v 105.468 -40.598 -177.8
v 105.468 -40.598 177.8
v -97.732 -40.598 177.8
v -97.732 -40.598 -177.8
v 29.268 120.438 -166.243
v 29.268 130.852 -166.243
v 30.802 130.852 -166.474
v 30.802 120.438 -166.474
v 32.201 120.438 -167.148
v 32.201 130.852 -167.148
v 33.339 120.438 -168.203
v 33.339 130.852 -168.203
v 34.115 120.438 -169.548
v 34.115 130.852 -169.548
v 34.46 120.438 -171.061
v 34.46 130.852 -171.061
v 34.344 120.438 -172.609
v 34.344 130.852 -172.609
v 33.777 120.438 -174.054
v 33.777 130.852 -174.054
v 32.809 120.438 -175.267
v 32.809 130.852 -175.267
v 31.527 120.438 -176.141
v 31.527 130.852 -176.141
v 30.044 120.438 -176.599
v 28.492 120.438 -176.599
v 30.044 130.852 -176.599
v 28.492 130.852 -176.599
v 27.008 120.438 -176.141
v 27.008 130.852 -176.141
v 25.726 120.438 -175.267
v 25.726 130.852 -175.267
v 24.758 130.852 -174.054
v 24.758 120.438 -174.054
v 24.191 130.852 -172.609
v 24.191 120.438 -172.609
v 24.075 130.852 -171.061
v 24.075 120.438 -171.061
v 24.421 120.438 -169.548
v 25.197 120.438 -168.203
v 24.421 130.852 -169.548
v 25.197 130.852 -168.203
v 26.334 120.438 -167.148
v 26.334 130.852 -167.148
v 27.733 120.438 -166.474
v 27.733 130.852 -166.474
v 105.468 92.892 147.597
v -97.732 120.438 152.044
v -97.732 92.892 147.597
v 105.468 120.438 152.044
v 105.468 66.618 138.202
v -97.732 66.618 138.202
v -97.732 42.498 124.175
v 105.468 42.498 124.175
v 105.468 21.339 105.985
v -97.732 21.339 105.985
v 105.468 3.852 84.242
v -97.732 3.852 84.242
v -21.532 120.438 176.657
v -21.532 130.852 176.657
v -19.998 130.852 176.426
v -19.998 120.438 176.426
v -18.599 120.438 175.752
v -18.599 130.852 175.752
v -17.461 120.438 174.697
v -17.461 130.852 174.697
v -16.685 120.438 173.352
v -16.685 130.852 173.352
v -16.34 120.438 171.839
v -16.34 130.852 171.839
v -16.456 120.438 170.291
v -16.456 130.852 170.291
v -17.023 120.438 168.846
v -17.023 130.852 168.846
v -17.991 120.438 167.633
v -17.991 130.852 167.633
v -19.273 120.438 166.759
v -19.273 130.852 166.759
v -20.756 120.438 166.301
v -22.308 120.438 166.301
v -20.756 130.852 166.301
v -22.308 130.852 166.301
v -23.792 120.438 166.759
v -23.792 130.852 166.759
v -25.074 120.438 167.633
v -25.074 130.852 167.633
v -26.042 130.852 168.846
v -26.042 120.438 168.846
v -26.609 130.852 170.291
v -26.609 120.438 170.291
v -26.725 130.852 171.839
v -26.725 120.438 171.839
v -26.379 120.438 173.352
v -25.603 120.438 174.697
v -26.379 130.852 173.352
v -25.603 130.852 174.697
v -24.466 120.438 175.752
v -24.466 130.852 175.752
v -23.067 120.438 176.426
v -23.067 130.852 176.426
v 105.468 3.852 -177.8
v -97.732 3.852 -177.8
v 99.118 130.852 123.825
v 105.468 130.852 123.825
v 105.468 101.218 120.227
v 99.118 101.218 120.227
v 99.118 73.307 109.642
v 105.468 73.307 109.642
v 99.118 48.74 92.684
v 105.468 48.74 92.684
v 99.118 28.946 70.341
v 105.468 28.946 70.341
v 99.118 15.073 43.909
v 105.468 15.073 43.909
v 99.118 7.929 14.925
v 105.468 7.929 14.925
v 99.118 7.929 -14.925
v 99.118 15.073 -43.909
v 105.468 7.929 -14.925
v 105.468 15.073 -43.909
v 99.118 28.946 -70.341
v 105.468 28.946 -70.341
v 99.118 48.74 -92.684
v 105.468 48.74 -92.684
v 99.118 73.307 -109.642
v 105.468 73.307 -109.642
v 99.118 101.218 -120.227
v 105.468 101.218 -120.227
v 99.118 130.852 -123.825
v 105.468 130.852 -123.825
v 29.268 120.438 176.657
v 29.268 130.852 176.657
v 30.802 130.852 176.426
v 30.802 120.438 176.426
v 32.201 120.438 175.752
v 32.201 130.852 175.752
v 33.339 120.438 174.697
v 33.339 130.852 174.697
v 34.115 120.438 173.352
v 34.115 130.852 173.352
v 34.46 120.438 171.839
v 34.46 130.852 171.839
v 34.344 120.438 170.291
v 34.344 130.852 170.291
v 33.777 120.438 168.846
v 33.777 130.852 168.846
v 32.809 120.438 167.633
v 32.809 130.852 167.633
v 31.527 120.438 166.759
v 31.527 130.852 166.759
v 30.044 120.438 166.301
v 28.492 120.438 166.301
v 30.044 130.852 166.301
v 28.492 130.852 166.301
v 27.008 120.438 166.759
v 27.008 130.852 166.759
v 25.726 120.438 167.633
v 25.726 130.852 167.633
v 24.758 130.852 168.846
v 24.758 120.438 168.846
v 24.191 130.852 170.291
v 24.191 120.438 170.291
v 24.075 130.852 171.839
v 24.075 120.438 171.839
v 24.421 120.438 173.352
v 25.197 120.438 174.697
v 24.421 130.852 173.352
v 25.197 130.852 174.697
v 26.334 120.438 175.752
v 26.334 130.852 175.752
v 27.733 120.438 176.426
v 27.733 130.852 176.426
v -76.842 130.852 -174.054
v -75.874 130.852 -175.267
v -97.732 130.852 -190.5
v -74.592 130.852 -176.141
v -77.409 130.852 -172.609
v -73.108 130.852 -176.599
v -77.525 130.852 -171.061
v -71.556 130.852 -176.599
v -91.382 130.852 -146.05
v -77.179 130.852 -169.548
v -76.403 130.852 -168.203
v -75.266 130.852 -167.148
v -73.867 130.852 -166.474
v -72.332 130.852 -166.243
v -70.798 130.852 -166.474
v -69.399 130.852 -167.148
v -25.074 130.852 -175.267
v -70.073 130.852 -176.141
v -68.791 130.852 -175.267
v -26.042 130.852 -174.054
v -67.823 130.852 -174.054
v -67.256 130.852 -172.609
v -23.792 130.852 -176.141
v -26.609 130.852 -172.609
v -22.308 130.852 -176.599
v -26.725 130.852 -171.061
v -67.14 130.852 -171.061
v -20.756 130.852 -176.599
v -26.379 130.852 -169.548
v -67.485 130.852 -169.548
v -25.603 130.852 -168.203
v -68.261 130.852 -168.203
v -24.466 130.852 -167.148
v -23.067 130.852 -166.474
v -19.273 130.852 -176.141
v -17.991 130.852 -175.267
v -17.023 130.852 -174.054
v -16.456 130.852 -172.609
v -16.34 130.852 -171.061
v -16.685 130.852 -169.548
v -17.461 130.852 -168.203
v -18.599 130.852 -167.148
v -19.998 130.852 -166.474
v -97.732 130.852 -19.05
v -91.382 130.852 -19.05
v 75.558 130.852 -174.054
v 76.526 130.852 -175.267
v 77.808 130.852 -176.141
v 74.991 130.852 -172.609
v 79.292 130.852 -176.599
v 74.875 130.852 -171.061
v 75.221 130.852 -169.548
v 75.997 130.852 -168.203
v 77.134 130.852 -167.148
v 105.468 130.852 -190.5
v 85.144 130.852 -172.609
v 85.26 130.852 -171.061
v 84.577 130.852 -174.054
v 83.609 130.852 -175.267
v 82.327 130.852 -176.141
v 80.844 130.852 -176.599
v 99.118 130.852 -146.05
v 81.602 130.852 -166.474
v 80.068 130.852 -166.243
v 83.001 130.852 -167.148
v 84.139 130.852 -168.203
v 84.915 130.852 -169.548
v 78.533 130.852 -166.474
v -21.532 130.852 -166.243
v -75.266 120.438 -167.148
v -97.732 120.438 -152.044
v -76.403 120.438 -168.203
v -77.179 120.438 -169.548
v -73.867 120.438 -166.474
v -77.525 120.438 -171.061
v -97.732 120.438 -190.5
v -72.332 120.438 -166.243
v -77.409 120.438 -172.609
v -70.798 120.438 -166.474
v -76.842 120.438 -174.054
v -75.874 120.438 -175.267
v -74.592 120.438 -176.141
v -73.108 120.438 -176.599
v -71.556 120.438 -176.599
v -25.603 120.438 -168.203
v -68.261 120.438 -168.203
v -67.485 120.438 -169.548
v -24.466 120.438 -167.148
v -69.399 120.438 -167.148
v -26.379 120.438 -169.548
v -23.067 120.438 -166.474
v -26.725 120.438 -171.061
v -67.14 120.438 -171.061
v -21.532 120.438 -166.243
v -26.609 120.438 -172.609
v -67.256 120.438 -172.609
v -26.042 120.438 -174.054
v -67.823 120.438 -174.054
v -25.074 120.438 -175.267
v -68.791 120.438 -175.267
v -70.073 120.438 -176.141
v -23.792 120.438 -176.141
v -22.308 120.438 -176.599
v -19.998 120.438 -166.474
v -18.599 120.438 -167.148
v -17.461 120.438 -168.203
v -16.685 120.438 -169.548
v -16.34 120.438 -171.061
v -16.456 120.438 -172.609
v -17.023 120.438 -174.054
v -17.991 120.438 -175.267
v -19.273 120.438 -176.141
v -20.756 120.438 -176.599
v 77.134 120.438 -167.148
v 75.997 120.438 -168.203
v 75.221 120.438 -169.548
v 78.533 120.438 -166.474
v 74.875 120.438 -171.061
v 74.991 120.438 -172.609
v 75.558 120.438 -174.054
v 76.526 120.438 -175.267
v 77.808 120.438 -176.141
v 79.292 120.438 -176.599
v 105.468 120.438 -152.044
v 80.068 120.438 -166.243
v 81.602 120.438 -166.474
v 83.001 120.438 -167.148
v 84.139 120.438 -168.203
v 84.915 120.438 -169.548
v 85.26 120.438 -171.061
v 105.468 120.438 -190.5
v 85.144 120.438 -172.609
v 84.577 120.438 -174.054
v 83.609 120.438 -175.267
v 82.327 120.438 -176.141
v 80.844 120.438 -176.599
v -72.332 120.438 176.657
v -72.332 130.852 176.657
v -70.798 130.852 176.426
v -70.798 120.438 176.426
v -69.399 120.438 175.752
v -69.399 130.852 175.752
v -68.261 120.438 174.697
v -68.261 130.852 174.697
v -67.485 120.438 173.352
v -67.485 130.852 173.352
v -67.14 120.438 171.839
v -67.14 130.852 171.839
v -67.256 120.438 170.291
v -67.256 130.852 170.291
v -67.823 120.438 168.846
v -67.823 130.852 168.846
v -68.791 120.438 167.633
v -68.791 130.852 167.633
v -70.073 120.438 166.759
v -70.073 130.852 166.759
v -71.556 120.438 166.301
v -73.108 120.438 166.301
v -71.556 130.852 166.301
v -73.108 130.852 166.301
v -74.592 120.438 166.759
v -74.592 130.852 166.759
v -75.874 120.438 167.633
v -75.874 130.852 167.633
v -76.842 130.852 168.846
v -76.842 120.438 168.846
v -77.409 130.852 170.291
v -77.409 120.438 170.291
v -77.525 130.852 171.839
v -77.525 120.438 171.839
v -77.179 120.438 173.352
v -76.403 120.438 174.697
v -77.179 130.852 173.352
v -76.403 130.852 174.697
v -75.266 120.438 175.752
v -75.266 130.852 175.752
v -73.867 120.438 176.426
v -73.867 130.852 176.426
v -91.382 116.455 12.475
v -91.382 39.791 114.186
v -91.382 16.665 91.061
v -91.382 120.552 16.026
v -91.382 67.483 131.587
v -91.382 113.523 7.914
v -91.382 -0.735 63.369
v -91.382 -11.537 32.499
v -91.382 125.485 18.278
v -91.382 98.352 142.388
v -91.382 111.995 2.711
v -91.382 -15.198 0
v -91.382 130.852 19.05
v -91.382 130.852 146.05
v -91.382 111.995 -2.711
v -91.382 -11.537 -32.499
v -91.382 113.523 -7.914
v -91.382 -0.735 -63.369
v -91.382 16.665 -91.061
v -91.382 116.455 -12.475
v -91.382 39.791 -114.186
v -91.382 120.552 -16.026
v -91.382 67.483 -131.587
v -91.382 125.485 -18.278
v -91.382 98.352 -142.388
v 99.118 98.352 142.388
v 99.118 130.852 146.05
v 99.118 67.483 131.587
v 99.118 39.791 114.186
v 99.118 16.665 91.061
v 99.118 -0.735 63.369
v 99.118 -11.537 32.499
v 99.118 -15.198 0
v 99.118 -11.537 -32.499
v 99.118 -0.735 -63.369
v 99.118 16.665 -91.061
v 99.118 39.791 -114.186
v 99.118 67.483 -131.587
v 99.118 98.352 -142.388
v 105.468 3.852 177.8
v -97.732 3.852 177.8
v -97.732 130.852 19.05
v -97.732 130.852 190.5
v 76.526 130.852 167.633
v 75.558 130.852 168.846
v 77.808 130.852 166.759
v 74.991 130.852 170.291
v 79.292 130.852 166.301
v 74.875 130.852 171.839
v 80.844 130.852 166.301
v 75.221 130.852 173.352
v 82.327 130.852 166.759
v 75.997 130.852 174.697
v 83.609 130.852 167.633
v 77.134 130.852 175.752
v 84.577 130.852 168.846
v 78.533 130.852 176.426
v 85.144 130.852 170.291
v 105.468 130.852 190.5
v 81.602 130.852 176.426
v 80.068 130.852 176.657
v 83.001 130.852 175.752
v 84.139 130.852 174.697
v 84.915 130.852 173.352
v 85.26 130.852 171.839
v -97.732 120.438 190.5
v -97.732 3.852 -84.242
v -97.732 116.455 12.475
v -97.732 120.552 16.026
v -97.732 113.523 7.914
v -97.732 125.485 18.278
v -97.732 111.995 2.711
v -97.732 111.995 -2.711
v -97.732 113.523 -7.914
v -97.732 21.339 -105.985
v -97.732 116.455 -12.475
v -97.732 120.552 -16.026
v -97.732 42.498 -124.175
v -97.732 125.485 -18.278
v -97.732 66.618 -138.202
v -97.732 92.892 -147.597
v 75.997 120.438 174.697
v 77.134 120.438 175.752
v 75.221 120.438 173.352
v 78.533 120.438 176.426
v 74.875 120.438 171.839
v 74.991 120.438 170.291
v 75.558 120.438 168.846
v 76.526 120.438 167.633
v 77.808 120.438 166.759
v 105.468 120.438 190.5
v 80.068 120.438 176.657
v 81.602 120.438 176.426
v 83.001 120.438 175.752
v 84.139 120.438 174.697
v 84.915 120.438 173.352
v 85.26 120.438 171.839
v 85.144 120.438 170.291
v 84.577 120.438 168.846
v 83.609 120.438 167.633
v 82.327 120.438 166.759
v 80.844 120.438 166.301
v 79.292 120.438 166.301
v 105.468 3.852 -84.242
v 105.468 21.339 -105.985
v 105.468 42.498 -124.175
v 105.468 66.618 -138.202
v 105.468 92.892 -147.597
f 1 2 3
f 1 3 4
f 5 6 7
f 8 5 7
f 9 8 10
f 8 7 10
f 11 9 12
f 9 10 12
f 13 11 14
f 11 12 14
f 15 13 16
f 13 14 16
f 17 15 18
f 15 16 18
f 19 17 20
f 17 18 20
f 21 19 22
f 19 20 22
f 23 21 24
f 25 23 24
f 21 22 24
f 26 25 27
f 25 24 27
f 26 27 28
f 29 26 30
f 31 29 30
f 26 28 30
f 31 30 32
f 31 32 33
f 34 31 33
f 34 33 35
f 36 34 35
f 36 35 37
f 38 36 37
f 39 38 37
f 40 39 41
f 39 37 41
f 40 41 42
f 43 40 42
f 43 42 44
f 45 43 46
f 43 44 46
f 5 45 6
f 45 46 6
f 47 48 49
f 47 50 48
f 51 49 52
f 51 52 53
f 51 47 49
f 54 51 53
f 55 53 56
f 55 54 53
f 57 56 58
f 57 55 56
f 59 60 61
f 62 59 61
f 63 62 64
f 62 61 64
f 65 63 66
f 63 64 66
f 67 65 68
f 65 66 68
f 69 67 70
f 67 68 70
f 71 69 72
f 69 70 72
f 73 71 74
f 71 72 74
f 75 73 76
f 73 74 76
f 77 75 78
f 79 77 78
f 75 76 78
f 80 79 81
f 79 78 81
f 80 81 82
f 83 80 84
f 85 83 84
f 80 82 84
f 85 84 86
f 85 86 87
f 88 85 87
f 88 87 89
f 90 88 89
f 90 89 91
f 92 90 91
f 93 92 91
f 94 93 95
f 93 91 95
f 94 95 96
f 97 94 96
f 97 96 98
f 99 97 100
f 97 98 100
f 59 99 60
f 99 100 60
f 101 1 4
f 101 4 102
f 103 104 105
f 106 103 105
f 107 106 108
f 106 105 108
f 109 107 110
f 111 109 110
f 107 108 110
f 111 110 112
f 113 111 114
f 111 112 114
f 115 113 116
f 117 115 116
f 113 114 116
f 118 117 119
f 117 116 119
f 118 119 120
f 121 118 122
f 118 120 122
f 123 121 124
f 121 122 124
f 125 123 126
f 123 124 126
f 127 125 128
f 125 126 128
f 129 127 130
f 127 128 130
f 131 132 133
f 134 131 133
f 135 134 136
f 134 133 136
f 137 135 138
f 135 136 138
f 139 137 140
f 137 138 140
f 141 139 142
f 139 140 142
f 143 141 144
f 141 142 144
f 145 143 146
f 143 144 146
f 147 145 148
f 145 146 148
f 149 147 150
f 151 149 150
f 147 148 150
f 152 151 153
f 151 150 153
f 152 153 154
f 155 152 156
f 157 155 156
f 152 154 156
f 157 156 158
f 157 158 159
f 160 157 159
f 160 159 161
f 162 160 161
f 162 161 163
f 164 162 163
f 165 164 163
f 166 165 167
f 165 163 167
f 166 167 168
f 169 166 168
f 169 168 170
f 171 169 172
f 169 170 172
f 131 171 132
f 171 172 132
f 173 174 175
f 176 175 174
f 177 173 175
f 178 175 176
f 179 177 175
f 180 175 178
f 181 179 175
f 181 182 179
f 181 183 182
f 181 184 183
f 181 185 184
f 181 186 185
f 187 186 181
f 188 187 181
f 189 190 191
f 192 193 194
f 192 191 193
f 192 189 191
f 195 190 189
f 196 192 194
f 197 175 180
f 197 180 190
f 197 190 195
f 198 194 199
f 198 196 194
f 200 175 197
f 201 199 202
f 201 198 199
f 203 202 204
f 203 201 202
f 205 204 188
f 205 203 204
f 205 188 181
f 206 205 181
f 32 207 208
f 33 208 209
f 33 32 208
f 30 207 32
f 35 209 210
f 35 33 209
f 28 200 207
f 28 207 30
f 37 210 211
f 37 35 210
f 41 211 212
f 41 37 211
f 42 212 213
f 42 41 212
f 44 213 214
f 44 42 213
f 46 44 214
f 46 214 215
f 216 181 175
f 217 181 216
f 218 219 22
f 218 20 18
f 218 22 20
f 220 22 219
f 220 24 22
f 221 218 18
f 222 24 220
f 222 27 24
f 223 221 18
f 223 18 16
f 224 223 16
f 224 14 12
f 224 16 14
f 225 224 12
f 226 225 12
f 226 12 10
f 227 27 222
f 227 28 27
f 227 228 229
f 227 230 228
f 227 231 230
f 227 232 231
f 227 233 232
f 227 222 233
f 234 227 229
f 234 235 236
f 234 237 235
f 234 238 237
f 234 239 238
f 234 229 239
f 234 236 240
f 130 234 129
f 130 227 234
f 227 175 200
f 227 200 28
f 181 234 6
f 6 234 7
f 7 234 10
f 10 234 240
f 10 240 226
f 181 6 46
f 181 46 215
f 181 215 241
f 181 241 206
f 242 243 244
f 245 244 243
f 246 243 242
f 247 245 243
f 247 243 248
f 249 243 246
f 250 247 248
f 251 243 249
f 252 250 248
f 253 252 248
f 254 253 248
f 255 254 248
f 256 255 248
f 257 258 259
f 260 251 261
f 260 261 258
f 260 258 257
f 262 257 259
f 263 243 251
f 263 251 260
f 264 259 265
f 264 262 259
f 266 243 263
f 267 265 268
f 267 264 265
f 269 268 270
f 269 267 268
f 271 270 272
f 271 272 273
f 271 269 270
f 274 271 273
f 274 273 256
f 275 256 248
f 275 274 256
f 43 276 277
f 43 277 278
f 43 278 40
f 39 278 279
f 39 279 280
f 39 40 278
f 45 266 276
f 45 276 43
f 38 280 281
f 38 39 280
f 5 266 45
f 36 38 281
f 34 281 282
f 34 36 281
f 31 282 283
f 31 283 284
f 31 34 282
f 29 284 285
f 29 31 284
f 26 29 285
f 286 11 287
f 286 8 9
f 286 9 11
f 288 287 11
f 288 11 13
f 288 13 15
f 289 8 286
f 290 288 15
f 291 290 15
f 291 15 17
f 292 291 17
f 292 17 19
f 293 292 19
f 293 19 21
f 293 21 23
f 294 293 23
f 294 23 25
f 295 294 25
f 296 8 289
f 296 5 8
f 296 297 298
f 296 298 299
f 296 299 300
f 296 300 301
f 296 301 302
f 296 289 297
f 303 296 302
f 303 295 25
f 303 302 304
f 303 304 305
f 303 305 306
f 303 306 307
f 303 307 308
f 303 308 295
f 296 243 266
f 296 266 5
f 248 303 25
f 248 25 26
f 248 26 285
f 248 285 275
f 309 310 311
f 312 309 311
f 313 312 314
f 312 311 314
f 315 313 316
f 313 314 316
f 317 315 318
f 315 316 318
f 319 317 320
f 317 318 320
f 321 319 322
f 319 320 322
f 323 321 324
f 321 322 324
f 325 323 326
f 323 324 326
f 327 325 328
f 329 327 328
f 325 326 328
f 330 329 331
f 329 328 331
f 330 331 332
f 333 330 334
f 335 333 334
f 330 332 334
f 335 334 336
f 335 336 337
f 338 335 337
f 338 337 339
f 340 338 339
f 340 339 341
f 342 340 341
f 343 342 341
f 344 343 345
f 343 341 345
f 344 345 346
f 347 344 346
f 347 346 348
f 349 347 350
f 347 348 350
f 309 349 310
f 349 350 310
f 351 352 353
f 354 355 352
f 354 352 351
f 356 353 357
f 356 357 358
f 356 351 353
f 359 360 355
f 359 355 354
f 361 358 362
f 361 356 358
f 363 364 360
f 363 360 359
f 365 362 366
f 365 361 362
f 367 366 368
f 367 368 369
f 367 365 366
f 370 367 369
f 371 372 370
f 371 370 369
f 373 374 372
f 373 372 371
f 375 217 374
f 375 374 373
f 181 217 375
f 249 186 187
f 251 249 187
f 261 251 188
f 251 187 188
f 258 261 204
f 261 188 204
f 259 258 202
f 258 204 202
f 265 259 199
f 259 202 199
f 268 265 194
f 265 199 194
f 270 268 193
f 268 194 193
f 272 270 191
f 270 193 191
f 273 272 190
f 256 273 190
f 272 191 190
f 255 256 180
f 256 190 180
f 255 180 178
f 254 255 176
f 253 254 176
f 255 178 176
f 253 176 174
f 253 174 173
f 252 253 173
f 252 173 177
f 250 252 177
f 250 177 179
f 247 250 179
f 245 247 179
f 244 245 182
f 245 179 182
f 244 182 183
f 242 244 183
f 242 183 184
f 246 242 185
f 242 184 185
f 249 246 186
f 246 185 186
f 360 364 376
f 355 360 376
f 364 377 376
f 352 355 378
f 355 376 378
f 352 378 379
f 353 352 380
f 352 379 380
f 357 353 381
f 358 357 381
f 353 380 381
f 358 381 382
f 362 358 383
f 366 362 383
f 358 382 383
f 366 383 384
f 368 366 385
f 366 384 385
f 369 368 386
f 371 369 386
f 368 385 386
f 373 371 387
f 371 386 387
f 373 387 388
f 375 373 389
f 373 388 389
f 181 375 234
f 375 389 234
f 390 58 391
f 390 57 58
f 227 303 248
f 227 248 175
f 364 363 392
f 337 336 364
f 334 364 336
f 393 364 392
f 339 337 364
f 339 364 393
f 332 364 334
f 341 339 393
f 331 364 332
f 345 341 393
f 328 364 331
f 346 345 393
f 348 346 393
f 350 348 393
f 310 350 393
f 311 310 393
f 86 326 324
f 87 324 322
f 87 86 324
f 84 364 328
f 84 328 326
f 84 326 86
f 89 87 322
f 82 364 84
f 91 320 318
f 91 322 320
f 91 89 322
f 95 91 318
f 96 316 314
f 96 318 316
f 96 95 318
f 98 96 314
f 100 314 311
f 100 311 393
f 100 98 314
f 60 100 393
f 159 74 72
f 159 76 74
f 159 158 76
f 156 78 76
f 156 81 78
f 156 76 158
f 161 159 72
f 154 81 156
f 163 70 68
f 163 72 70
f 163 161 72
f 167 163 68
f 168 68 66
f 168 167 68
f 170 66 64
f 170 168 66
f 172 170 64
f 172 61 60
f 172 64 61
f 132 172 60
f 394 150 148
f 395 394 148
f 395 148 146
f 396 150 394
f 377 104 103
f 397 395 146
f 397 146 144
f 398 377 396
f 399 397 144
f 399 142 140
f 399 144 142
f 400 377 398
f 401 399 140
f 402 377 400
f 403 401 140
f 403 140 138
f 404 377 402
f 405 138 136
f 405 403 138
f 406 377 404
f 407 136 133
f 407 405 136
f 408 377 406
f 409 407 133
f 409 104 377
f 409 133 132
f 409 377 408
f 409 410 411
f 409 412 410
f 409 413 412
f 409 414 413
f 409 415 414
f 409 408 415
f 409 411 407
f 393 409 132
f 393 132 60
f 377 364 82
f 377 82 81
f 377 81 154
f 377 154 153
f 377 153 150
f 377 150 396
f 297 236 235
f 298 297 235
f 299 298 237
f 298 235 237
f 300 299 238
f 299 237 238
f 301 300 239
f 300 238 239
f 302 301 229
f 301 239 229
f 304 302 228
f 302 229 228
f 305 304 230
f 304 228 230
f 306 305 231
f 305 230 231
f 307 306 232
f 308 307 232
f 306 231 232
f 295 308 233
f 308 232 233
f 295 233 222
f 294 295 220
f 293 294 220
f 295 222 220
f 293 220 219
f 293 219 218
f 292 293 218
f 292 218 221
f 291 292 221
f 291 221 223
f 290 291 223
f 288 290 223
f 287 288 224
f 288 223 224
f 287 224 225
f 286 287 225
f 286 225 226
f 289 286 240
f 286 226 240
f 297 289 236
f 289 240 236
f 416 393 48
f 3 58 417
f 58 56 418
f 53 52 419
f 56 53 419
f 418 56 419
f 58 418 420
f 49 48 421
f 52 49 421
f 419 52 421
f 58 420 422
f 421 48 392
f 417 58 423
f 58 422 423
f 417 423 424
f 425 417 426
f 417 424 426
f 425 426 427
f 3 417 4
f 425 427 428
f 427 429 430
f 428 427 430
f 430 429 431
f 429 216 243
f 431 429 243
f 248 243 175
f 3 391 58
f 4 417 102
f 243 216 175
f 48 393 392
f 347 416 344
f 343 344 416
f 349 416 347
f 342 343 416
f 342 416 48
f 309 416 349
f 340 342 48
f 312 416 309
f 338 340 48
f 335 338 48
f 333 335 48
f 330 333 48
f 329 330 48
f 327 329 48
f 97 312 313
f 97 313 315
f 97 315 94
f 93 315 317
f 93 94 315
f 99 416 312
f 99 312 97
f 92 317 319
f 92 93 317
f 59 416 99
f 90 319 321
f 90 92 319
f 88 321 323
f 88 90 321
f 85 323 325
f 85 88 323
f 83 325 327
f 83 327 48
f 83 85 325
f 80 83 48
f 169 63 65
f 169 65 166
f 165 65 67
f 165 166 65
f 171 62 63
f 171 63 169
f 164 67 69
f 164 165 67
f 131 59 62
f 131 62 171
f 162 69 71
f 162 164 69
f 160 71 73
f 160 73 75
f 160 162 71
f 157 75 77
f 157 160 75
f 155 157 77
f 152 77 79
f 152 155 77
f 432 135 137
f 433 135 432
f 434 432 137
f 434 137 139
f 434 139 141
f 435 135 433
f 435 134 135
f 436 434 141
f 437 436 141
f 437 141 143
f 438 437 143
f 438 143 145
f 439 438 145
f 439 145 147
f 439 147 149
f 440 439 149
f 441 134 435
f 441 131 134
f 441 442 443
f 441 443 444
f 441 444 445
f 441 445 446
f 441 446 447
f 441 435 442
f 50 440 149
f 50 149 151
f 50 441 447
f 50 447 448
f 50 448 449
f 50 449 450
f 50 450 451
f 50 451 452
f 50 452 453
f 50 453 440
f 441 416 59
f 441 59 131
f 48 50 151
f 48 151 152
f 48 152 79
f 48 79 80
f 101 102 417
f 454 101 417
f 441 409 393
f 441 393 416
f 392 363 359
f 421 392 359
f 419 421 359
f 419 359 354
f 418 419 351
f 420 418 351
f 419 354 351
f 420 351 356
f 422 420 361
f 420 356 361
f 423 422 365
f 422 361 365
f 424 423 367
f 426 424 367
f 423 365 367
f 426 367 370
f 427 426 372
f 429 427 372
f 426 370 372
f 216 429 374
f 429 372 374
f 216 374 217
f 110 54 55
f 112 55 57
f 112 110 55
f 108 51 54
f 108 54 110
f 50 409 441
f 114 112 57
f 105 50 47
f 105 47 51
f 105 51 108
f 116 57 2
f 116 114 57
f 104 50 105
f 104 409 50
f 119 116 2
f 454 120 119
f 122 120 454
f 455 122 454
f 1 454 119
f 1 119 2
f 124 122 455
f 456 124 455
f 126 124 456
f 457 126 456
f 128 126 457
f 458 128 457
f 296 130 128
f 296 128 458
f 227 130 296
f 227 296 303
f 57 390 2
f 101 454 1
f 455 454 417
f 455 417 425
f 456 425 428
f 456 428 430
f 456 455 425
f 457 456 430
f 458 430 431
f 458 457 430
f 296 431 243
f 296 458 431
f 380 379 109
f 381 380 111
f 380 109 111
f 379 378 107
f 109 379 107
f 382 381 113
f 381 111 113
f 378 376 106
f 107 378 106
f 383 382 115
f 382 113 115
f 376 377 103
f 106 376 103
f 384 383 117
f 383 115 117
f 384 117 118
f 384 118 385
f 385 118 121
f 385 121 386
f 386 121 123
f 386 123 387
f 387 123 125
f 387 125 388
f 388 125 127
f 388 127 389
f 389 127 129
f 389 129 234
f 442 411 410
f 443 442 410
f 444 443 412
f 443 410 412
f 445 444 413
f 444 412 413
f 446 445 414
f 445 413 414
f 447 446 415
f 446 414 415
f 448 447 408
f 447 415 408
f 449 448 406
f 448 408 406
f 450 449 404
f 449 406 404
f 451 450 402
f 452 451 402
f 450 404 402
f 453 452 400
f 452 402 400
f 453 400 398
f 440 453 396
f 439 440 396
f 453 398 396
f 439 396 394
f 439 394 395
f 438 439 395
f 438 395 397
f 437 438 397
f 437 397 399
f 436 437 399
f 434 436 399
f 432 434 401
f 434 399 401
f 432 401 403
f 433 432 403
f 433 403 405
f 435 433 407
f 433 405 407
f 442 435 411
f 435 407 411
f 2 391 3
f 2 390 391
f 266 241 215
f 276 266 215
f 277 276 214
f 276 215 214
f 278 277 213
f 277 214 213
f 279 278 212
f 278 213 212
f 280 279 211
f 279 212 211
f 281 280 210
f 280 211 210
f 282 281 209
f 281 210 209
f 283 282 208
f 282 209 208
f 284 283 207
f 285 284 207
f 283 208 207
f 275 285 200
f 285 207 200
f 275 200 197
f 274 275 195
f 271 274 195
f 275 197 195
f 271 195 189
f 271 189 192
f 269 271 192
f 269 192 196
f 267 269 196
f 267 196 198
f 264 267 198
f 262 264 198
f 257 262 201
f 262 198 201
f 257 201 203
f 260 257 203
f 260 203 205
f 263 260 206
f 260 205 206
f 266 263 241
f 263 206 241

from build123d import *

# Parameters (mm, degrees)
BOSS_EXTRUDE1_DEPTH  = 4
SKETCH2_R            = 5.75
CUT_EXTRUDE1_DEPTH   = 3.75
SKETCH5_R            = 0.205
CUT_EXTRUDE2_DEPTH   = 0.41
LPATTERN1_COUNT      = 4
LPATTERN1_PITCH      = 2
LPATTERN1_COUNT_DIR2 = 2
LPATTERN1_PITCH_DIR2 = 13.5
CUT_EXTRUDE3_DEPTH   = 13.440483311
CUT_EXTRUDE4_REACH   = 14.44
SKETCH6_3_R          = 4.875
SKETCH6_3_R_2        = 0.75
SCALE1_SCALE         = 25.4


with BuildPart() as part:
    # Sketch1 → Boss-Extrude1 (new, symmetric)
    with BuildSketch(Plane(origin=(0, 0, 0), x_dir=(0, 0, -1), z_dir=(1, 0, 0))):
        with BuildLine():
            Line((-7, 0.875), (-7, -0.875))
            Line((-7, -0.875), (7, -0.875))
            Line((7, -0.875), (7, 0.875))
            Line((7, 0.875), (3.31662479, 0.875))
            ThreePointArc((3.31662479, 0.875), (5.186676874, 2.858647401), (5.985975276, 5.465))
            Line((5.985975276, 5.465), (7.5, 5.465))
            Line((7.5, 5.465), (7.5, 5.875))
            Line((7.5, 5.875), (-7.5, 5.875))
            Line((-7.5, 5.875), (-7.5, 5.465))
            Line((-7.5, 5.465), (-5.985975276, 5.465))
            ThreePointArc((-5.985975276, 5.465), (-5.186676874, 2.858647401), (-3.31662479, 0.875))
            Line((-3.31662479, 0.875), (-7, 0.875))
        make_face()
    extrude(amount=BOSS_EXTRUDE1_DEPTH, both=True)

    # Sketch2 → Cut-Extrude1 (cut, symmetric)
    with BuildSketch(Plane(origin=(0, 0, 0), x_dir=(0, 0, -1), z_dir=(1, 0, 0))):
        with Locations((0, 5.875)):
            Circle(SKETCH2_R)
    extrude(amount=CUT_EXTRUDE1_DEPTH, both=True, mode=Mode.SUBTRACT)

    # Sketch5 → Cut-Extrude2 (cut)
    with BuildSketch(Plane(origin=(0, 5.875, 0), x_dir=(1, 0, 0), z_dir=(0, 1, 0))):
        with Locations(Location((-3, 6.75, 0), (0, 0, 270))):
            Circle(SKETCH5_R)
    cut_extrude2 = extrude(amount=-CUT_EXTRUDE2_DEPTH, mode=Mode.SUBTRACT)

    # LPattern1: Cut-Extrude2 4 × 2
    with Locations(*[(i * LPATTERN1_PITCH, 0, j * LPATTERN1_PITCH_DIR2) for i in range(LPATTERN1_COUNT) for j in range(LPATTERN1_COUNT_DIR2) if (i, j) != (0, 0)]):
        add(cut_extrude2, mode=Mode.SUBTRACT)

    # Sketch6 → Cut-Extrude3 (cut, through all)
    with BuildSketch(Plane(origin=(4, 0, 0), x_dir=(0, 0, -1), z_dir=(1, 0, 0))):
        with BuildLine():
            Line((-0.75, 5.875), (0.75, 5.875))
            ThreePointArc((0.75, 5.875), (0, 6.625), (-0.75, 5.875))
        make_face()
        with BuildLine():
            ThreePointArc((-0.75, 5.875), (0, 5.125), (0.75, 5.875))
            Line((0.75, 5.875), (-0.75, 5.875))
        make_face()
    extrude(amount=-CUT_EXTRUDE3_DEPTH, mode=Mode.SUBTRACT)

    # Sketch6<3> → Cut-Extrude4 (cut, up to next)
    with BuildSketch(Plane(origin=(4, 0, 0), x_dir=(0, 0, -1), z_dir=(1, 0, 0)), mode=Mode.PRIVATE) as cut_extrude4_sk1:
        with Locations((0, 5.875)):
            Circle(SKETCH6_3_R)
        with Locations((0, 5.875)):
            Circle(SKETCH6_3_R_2, mode=Mode.SUBTRACT)
    cut_extrude4_tool1 = extrude(cut_extrude4_sk1.sketch, amount=-CUT_EXTRUDE4_REACH, mode=Mode.PRIVATE) & part.part
    add(cut_extrude4_tool1.solids().sort_by_distance((4, 5.875, 4.737114))[0], mode=Mode.SUBTRACT)


with BuildPart() as part_1:
    # Scale1: scaled about (-0.158509588, 0.753010739, 0)
    add(part.part.scale(SCALE1_SCALE).moved(Location((3.867633947, -18.373462032, 0))))


solid = part_1.part
